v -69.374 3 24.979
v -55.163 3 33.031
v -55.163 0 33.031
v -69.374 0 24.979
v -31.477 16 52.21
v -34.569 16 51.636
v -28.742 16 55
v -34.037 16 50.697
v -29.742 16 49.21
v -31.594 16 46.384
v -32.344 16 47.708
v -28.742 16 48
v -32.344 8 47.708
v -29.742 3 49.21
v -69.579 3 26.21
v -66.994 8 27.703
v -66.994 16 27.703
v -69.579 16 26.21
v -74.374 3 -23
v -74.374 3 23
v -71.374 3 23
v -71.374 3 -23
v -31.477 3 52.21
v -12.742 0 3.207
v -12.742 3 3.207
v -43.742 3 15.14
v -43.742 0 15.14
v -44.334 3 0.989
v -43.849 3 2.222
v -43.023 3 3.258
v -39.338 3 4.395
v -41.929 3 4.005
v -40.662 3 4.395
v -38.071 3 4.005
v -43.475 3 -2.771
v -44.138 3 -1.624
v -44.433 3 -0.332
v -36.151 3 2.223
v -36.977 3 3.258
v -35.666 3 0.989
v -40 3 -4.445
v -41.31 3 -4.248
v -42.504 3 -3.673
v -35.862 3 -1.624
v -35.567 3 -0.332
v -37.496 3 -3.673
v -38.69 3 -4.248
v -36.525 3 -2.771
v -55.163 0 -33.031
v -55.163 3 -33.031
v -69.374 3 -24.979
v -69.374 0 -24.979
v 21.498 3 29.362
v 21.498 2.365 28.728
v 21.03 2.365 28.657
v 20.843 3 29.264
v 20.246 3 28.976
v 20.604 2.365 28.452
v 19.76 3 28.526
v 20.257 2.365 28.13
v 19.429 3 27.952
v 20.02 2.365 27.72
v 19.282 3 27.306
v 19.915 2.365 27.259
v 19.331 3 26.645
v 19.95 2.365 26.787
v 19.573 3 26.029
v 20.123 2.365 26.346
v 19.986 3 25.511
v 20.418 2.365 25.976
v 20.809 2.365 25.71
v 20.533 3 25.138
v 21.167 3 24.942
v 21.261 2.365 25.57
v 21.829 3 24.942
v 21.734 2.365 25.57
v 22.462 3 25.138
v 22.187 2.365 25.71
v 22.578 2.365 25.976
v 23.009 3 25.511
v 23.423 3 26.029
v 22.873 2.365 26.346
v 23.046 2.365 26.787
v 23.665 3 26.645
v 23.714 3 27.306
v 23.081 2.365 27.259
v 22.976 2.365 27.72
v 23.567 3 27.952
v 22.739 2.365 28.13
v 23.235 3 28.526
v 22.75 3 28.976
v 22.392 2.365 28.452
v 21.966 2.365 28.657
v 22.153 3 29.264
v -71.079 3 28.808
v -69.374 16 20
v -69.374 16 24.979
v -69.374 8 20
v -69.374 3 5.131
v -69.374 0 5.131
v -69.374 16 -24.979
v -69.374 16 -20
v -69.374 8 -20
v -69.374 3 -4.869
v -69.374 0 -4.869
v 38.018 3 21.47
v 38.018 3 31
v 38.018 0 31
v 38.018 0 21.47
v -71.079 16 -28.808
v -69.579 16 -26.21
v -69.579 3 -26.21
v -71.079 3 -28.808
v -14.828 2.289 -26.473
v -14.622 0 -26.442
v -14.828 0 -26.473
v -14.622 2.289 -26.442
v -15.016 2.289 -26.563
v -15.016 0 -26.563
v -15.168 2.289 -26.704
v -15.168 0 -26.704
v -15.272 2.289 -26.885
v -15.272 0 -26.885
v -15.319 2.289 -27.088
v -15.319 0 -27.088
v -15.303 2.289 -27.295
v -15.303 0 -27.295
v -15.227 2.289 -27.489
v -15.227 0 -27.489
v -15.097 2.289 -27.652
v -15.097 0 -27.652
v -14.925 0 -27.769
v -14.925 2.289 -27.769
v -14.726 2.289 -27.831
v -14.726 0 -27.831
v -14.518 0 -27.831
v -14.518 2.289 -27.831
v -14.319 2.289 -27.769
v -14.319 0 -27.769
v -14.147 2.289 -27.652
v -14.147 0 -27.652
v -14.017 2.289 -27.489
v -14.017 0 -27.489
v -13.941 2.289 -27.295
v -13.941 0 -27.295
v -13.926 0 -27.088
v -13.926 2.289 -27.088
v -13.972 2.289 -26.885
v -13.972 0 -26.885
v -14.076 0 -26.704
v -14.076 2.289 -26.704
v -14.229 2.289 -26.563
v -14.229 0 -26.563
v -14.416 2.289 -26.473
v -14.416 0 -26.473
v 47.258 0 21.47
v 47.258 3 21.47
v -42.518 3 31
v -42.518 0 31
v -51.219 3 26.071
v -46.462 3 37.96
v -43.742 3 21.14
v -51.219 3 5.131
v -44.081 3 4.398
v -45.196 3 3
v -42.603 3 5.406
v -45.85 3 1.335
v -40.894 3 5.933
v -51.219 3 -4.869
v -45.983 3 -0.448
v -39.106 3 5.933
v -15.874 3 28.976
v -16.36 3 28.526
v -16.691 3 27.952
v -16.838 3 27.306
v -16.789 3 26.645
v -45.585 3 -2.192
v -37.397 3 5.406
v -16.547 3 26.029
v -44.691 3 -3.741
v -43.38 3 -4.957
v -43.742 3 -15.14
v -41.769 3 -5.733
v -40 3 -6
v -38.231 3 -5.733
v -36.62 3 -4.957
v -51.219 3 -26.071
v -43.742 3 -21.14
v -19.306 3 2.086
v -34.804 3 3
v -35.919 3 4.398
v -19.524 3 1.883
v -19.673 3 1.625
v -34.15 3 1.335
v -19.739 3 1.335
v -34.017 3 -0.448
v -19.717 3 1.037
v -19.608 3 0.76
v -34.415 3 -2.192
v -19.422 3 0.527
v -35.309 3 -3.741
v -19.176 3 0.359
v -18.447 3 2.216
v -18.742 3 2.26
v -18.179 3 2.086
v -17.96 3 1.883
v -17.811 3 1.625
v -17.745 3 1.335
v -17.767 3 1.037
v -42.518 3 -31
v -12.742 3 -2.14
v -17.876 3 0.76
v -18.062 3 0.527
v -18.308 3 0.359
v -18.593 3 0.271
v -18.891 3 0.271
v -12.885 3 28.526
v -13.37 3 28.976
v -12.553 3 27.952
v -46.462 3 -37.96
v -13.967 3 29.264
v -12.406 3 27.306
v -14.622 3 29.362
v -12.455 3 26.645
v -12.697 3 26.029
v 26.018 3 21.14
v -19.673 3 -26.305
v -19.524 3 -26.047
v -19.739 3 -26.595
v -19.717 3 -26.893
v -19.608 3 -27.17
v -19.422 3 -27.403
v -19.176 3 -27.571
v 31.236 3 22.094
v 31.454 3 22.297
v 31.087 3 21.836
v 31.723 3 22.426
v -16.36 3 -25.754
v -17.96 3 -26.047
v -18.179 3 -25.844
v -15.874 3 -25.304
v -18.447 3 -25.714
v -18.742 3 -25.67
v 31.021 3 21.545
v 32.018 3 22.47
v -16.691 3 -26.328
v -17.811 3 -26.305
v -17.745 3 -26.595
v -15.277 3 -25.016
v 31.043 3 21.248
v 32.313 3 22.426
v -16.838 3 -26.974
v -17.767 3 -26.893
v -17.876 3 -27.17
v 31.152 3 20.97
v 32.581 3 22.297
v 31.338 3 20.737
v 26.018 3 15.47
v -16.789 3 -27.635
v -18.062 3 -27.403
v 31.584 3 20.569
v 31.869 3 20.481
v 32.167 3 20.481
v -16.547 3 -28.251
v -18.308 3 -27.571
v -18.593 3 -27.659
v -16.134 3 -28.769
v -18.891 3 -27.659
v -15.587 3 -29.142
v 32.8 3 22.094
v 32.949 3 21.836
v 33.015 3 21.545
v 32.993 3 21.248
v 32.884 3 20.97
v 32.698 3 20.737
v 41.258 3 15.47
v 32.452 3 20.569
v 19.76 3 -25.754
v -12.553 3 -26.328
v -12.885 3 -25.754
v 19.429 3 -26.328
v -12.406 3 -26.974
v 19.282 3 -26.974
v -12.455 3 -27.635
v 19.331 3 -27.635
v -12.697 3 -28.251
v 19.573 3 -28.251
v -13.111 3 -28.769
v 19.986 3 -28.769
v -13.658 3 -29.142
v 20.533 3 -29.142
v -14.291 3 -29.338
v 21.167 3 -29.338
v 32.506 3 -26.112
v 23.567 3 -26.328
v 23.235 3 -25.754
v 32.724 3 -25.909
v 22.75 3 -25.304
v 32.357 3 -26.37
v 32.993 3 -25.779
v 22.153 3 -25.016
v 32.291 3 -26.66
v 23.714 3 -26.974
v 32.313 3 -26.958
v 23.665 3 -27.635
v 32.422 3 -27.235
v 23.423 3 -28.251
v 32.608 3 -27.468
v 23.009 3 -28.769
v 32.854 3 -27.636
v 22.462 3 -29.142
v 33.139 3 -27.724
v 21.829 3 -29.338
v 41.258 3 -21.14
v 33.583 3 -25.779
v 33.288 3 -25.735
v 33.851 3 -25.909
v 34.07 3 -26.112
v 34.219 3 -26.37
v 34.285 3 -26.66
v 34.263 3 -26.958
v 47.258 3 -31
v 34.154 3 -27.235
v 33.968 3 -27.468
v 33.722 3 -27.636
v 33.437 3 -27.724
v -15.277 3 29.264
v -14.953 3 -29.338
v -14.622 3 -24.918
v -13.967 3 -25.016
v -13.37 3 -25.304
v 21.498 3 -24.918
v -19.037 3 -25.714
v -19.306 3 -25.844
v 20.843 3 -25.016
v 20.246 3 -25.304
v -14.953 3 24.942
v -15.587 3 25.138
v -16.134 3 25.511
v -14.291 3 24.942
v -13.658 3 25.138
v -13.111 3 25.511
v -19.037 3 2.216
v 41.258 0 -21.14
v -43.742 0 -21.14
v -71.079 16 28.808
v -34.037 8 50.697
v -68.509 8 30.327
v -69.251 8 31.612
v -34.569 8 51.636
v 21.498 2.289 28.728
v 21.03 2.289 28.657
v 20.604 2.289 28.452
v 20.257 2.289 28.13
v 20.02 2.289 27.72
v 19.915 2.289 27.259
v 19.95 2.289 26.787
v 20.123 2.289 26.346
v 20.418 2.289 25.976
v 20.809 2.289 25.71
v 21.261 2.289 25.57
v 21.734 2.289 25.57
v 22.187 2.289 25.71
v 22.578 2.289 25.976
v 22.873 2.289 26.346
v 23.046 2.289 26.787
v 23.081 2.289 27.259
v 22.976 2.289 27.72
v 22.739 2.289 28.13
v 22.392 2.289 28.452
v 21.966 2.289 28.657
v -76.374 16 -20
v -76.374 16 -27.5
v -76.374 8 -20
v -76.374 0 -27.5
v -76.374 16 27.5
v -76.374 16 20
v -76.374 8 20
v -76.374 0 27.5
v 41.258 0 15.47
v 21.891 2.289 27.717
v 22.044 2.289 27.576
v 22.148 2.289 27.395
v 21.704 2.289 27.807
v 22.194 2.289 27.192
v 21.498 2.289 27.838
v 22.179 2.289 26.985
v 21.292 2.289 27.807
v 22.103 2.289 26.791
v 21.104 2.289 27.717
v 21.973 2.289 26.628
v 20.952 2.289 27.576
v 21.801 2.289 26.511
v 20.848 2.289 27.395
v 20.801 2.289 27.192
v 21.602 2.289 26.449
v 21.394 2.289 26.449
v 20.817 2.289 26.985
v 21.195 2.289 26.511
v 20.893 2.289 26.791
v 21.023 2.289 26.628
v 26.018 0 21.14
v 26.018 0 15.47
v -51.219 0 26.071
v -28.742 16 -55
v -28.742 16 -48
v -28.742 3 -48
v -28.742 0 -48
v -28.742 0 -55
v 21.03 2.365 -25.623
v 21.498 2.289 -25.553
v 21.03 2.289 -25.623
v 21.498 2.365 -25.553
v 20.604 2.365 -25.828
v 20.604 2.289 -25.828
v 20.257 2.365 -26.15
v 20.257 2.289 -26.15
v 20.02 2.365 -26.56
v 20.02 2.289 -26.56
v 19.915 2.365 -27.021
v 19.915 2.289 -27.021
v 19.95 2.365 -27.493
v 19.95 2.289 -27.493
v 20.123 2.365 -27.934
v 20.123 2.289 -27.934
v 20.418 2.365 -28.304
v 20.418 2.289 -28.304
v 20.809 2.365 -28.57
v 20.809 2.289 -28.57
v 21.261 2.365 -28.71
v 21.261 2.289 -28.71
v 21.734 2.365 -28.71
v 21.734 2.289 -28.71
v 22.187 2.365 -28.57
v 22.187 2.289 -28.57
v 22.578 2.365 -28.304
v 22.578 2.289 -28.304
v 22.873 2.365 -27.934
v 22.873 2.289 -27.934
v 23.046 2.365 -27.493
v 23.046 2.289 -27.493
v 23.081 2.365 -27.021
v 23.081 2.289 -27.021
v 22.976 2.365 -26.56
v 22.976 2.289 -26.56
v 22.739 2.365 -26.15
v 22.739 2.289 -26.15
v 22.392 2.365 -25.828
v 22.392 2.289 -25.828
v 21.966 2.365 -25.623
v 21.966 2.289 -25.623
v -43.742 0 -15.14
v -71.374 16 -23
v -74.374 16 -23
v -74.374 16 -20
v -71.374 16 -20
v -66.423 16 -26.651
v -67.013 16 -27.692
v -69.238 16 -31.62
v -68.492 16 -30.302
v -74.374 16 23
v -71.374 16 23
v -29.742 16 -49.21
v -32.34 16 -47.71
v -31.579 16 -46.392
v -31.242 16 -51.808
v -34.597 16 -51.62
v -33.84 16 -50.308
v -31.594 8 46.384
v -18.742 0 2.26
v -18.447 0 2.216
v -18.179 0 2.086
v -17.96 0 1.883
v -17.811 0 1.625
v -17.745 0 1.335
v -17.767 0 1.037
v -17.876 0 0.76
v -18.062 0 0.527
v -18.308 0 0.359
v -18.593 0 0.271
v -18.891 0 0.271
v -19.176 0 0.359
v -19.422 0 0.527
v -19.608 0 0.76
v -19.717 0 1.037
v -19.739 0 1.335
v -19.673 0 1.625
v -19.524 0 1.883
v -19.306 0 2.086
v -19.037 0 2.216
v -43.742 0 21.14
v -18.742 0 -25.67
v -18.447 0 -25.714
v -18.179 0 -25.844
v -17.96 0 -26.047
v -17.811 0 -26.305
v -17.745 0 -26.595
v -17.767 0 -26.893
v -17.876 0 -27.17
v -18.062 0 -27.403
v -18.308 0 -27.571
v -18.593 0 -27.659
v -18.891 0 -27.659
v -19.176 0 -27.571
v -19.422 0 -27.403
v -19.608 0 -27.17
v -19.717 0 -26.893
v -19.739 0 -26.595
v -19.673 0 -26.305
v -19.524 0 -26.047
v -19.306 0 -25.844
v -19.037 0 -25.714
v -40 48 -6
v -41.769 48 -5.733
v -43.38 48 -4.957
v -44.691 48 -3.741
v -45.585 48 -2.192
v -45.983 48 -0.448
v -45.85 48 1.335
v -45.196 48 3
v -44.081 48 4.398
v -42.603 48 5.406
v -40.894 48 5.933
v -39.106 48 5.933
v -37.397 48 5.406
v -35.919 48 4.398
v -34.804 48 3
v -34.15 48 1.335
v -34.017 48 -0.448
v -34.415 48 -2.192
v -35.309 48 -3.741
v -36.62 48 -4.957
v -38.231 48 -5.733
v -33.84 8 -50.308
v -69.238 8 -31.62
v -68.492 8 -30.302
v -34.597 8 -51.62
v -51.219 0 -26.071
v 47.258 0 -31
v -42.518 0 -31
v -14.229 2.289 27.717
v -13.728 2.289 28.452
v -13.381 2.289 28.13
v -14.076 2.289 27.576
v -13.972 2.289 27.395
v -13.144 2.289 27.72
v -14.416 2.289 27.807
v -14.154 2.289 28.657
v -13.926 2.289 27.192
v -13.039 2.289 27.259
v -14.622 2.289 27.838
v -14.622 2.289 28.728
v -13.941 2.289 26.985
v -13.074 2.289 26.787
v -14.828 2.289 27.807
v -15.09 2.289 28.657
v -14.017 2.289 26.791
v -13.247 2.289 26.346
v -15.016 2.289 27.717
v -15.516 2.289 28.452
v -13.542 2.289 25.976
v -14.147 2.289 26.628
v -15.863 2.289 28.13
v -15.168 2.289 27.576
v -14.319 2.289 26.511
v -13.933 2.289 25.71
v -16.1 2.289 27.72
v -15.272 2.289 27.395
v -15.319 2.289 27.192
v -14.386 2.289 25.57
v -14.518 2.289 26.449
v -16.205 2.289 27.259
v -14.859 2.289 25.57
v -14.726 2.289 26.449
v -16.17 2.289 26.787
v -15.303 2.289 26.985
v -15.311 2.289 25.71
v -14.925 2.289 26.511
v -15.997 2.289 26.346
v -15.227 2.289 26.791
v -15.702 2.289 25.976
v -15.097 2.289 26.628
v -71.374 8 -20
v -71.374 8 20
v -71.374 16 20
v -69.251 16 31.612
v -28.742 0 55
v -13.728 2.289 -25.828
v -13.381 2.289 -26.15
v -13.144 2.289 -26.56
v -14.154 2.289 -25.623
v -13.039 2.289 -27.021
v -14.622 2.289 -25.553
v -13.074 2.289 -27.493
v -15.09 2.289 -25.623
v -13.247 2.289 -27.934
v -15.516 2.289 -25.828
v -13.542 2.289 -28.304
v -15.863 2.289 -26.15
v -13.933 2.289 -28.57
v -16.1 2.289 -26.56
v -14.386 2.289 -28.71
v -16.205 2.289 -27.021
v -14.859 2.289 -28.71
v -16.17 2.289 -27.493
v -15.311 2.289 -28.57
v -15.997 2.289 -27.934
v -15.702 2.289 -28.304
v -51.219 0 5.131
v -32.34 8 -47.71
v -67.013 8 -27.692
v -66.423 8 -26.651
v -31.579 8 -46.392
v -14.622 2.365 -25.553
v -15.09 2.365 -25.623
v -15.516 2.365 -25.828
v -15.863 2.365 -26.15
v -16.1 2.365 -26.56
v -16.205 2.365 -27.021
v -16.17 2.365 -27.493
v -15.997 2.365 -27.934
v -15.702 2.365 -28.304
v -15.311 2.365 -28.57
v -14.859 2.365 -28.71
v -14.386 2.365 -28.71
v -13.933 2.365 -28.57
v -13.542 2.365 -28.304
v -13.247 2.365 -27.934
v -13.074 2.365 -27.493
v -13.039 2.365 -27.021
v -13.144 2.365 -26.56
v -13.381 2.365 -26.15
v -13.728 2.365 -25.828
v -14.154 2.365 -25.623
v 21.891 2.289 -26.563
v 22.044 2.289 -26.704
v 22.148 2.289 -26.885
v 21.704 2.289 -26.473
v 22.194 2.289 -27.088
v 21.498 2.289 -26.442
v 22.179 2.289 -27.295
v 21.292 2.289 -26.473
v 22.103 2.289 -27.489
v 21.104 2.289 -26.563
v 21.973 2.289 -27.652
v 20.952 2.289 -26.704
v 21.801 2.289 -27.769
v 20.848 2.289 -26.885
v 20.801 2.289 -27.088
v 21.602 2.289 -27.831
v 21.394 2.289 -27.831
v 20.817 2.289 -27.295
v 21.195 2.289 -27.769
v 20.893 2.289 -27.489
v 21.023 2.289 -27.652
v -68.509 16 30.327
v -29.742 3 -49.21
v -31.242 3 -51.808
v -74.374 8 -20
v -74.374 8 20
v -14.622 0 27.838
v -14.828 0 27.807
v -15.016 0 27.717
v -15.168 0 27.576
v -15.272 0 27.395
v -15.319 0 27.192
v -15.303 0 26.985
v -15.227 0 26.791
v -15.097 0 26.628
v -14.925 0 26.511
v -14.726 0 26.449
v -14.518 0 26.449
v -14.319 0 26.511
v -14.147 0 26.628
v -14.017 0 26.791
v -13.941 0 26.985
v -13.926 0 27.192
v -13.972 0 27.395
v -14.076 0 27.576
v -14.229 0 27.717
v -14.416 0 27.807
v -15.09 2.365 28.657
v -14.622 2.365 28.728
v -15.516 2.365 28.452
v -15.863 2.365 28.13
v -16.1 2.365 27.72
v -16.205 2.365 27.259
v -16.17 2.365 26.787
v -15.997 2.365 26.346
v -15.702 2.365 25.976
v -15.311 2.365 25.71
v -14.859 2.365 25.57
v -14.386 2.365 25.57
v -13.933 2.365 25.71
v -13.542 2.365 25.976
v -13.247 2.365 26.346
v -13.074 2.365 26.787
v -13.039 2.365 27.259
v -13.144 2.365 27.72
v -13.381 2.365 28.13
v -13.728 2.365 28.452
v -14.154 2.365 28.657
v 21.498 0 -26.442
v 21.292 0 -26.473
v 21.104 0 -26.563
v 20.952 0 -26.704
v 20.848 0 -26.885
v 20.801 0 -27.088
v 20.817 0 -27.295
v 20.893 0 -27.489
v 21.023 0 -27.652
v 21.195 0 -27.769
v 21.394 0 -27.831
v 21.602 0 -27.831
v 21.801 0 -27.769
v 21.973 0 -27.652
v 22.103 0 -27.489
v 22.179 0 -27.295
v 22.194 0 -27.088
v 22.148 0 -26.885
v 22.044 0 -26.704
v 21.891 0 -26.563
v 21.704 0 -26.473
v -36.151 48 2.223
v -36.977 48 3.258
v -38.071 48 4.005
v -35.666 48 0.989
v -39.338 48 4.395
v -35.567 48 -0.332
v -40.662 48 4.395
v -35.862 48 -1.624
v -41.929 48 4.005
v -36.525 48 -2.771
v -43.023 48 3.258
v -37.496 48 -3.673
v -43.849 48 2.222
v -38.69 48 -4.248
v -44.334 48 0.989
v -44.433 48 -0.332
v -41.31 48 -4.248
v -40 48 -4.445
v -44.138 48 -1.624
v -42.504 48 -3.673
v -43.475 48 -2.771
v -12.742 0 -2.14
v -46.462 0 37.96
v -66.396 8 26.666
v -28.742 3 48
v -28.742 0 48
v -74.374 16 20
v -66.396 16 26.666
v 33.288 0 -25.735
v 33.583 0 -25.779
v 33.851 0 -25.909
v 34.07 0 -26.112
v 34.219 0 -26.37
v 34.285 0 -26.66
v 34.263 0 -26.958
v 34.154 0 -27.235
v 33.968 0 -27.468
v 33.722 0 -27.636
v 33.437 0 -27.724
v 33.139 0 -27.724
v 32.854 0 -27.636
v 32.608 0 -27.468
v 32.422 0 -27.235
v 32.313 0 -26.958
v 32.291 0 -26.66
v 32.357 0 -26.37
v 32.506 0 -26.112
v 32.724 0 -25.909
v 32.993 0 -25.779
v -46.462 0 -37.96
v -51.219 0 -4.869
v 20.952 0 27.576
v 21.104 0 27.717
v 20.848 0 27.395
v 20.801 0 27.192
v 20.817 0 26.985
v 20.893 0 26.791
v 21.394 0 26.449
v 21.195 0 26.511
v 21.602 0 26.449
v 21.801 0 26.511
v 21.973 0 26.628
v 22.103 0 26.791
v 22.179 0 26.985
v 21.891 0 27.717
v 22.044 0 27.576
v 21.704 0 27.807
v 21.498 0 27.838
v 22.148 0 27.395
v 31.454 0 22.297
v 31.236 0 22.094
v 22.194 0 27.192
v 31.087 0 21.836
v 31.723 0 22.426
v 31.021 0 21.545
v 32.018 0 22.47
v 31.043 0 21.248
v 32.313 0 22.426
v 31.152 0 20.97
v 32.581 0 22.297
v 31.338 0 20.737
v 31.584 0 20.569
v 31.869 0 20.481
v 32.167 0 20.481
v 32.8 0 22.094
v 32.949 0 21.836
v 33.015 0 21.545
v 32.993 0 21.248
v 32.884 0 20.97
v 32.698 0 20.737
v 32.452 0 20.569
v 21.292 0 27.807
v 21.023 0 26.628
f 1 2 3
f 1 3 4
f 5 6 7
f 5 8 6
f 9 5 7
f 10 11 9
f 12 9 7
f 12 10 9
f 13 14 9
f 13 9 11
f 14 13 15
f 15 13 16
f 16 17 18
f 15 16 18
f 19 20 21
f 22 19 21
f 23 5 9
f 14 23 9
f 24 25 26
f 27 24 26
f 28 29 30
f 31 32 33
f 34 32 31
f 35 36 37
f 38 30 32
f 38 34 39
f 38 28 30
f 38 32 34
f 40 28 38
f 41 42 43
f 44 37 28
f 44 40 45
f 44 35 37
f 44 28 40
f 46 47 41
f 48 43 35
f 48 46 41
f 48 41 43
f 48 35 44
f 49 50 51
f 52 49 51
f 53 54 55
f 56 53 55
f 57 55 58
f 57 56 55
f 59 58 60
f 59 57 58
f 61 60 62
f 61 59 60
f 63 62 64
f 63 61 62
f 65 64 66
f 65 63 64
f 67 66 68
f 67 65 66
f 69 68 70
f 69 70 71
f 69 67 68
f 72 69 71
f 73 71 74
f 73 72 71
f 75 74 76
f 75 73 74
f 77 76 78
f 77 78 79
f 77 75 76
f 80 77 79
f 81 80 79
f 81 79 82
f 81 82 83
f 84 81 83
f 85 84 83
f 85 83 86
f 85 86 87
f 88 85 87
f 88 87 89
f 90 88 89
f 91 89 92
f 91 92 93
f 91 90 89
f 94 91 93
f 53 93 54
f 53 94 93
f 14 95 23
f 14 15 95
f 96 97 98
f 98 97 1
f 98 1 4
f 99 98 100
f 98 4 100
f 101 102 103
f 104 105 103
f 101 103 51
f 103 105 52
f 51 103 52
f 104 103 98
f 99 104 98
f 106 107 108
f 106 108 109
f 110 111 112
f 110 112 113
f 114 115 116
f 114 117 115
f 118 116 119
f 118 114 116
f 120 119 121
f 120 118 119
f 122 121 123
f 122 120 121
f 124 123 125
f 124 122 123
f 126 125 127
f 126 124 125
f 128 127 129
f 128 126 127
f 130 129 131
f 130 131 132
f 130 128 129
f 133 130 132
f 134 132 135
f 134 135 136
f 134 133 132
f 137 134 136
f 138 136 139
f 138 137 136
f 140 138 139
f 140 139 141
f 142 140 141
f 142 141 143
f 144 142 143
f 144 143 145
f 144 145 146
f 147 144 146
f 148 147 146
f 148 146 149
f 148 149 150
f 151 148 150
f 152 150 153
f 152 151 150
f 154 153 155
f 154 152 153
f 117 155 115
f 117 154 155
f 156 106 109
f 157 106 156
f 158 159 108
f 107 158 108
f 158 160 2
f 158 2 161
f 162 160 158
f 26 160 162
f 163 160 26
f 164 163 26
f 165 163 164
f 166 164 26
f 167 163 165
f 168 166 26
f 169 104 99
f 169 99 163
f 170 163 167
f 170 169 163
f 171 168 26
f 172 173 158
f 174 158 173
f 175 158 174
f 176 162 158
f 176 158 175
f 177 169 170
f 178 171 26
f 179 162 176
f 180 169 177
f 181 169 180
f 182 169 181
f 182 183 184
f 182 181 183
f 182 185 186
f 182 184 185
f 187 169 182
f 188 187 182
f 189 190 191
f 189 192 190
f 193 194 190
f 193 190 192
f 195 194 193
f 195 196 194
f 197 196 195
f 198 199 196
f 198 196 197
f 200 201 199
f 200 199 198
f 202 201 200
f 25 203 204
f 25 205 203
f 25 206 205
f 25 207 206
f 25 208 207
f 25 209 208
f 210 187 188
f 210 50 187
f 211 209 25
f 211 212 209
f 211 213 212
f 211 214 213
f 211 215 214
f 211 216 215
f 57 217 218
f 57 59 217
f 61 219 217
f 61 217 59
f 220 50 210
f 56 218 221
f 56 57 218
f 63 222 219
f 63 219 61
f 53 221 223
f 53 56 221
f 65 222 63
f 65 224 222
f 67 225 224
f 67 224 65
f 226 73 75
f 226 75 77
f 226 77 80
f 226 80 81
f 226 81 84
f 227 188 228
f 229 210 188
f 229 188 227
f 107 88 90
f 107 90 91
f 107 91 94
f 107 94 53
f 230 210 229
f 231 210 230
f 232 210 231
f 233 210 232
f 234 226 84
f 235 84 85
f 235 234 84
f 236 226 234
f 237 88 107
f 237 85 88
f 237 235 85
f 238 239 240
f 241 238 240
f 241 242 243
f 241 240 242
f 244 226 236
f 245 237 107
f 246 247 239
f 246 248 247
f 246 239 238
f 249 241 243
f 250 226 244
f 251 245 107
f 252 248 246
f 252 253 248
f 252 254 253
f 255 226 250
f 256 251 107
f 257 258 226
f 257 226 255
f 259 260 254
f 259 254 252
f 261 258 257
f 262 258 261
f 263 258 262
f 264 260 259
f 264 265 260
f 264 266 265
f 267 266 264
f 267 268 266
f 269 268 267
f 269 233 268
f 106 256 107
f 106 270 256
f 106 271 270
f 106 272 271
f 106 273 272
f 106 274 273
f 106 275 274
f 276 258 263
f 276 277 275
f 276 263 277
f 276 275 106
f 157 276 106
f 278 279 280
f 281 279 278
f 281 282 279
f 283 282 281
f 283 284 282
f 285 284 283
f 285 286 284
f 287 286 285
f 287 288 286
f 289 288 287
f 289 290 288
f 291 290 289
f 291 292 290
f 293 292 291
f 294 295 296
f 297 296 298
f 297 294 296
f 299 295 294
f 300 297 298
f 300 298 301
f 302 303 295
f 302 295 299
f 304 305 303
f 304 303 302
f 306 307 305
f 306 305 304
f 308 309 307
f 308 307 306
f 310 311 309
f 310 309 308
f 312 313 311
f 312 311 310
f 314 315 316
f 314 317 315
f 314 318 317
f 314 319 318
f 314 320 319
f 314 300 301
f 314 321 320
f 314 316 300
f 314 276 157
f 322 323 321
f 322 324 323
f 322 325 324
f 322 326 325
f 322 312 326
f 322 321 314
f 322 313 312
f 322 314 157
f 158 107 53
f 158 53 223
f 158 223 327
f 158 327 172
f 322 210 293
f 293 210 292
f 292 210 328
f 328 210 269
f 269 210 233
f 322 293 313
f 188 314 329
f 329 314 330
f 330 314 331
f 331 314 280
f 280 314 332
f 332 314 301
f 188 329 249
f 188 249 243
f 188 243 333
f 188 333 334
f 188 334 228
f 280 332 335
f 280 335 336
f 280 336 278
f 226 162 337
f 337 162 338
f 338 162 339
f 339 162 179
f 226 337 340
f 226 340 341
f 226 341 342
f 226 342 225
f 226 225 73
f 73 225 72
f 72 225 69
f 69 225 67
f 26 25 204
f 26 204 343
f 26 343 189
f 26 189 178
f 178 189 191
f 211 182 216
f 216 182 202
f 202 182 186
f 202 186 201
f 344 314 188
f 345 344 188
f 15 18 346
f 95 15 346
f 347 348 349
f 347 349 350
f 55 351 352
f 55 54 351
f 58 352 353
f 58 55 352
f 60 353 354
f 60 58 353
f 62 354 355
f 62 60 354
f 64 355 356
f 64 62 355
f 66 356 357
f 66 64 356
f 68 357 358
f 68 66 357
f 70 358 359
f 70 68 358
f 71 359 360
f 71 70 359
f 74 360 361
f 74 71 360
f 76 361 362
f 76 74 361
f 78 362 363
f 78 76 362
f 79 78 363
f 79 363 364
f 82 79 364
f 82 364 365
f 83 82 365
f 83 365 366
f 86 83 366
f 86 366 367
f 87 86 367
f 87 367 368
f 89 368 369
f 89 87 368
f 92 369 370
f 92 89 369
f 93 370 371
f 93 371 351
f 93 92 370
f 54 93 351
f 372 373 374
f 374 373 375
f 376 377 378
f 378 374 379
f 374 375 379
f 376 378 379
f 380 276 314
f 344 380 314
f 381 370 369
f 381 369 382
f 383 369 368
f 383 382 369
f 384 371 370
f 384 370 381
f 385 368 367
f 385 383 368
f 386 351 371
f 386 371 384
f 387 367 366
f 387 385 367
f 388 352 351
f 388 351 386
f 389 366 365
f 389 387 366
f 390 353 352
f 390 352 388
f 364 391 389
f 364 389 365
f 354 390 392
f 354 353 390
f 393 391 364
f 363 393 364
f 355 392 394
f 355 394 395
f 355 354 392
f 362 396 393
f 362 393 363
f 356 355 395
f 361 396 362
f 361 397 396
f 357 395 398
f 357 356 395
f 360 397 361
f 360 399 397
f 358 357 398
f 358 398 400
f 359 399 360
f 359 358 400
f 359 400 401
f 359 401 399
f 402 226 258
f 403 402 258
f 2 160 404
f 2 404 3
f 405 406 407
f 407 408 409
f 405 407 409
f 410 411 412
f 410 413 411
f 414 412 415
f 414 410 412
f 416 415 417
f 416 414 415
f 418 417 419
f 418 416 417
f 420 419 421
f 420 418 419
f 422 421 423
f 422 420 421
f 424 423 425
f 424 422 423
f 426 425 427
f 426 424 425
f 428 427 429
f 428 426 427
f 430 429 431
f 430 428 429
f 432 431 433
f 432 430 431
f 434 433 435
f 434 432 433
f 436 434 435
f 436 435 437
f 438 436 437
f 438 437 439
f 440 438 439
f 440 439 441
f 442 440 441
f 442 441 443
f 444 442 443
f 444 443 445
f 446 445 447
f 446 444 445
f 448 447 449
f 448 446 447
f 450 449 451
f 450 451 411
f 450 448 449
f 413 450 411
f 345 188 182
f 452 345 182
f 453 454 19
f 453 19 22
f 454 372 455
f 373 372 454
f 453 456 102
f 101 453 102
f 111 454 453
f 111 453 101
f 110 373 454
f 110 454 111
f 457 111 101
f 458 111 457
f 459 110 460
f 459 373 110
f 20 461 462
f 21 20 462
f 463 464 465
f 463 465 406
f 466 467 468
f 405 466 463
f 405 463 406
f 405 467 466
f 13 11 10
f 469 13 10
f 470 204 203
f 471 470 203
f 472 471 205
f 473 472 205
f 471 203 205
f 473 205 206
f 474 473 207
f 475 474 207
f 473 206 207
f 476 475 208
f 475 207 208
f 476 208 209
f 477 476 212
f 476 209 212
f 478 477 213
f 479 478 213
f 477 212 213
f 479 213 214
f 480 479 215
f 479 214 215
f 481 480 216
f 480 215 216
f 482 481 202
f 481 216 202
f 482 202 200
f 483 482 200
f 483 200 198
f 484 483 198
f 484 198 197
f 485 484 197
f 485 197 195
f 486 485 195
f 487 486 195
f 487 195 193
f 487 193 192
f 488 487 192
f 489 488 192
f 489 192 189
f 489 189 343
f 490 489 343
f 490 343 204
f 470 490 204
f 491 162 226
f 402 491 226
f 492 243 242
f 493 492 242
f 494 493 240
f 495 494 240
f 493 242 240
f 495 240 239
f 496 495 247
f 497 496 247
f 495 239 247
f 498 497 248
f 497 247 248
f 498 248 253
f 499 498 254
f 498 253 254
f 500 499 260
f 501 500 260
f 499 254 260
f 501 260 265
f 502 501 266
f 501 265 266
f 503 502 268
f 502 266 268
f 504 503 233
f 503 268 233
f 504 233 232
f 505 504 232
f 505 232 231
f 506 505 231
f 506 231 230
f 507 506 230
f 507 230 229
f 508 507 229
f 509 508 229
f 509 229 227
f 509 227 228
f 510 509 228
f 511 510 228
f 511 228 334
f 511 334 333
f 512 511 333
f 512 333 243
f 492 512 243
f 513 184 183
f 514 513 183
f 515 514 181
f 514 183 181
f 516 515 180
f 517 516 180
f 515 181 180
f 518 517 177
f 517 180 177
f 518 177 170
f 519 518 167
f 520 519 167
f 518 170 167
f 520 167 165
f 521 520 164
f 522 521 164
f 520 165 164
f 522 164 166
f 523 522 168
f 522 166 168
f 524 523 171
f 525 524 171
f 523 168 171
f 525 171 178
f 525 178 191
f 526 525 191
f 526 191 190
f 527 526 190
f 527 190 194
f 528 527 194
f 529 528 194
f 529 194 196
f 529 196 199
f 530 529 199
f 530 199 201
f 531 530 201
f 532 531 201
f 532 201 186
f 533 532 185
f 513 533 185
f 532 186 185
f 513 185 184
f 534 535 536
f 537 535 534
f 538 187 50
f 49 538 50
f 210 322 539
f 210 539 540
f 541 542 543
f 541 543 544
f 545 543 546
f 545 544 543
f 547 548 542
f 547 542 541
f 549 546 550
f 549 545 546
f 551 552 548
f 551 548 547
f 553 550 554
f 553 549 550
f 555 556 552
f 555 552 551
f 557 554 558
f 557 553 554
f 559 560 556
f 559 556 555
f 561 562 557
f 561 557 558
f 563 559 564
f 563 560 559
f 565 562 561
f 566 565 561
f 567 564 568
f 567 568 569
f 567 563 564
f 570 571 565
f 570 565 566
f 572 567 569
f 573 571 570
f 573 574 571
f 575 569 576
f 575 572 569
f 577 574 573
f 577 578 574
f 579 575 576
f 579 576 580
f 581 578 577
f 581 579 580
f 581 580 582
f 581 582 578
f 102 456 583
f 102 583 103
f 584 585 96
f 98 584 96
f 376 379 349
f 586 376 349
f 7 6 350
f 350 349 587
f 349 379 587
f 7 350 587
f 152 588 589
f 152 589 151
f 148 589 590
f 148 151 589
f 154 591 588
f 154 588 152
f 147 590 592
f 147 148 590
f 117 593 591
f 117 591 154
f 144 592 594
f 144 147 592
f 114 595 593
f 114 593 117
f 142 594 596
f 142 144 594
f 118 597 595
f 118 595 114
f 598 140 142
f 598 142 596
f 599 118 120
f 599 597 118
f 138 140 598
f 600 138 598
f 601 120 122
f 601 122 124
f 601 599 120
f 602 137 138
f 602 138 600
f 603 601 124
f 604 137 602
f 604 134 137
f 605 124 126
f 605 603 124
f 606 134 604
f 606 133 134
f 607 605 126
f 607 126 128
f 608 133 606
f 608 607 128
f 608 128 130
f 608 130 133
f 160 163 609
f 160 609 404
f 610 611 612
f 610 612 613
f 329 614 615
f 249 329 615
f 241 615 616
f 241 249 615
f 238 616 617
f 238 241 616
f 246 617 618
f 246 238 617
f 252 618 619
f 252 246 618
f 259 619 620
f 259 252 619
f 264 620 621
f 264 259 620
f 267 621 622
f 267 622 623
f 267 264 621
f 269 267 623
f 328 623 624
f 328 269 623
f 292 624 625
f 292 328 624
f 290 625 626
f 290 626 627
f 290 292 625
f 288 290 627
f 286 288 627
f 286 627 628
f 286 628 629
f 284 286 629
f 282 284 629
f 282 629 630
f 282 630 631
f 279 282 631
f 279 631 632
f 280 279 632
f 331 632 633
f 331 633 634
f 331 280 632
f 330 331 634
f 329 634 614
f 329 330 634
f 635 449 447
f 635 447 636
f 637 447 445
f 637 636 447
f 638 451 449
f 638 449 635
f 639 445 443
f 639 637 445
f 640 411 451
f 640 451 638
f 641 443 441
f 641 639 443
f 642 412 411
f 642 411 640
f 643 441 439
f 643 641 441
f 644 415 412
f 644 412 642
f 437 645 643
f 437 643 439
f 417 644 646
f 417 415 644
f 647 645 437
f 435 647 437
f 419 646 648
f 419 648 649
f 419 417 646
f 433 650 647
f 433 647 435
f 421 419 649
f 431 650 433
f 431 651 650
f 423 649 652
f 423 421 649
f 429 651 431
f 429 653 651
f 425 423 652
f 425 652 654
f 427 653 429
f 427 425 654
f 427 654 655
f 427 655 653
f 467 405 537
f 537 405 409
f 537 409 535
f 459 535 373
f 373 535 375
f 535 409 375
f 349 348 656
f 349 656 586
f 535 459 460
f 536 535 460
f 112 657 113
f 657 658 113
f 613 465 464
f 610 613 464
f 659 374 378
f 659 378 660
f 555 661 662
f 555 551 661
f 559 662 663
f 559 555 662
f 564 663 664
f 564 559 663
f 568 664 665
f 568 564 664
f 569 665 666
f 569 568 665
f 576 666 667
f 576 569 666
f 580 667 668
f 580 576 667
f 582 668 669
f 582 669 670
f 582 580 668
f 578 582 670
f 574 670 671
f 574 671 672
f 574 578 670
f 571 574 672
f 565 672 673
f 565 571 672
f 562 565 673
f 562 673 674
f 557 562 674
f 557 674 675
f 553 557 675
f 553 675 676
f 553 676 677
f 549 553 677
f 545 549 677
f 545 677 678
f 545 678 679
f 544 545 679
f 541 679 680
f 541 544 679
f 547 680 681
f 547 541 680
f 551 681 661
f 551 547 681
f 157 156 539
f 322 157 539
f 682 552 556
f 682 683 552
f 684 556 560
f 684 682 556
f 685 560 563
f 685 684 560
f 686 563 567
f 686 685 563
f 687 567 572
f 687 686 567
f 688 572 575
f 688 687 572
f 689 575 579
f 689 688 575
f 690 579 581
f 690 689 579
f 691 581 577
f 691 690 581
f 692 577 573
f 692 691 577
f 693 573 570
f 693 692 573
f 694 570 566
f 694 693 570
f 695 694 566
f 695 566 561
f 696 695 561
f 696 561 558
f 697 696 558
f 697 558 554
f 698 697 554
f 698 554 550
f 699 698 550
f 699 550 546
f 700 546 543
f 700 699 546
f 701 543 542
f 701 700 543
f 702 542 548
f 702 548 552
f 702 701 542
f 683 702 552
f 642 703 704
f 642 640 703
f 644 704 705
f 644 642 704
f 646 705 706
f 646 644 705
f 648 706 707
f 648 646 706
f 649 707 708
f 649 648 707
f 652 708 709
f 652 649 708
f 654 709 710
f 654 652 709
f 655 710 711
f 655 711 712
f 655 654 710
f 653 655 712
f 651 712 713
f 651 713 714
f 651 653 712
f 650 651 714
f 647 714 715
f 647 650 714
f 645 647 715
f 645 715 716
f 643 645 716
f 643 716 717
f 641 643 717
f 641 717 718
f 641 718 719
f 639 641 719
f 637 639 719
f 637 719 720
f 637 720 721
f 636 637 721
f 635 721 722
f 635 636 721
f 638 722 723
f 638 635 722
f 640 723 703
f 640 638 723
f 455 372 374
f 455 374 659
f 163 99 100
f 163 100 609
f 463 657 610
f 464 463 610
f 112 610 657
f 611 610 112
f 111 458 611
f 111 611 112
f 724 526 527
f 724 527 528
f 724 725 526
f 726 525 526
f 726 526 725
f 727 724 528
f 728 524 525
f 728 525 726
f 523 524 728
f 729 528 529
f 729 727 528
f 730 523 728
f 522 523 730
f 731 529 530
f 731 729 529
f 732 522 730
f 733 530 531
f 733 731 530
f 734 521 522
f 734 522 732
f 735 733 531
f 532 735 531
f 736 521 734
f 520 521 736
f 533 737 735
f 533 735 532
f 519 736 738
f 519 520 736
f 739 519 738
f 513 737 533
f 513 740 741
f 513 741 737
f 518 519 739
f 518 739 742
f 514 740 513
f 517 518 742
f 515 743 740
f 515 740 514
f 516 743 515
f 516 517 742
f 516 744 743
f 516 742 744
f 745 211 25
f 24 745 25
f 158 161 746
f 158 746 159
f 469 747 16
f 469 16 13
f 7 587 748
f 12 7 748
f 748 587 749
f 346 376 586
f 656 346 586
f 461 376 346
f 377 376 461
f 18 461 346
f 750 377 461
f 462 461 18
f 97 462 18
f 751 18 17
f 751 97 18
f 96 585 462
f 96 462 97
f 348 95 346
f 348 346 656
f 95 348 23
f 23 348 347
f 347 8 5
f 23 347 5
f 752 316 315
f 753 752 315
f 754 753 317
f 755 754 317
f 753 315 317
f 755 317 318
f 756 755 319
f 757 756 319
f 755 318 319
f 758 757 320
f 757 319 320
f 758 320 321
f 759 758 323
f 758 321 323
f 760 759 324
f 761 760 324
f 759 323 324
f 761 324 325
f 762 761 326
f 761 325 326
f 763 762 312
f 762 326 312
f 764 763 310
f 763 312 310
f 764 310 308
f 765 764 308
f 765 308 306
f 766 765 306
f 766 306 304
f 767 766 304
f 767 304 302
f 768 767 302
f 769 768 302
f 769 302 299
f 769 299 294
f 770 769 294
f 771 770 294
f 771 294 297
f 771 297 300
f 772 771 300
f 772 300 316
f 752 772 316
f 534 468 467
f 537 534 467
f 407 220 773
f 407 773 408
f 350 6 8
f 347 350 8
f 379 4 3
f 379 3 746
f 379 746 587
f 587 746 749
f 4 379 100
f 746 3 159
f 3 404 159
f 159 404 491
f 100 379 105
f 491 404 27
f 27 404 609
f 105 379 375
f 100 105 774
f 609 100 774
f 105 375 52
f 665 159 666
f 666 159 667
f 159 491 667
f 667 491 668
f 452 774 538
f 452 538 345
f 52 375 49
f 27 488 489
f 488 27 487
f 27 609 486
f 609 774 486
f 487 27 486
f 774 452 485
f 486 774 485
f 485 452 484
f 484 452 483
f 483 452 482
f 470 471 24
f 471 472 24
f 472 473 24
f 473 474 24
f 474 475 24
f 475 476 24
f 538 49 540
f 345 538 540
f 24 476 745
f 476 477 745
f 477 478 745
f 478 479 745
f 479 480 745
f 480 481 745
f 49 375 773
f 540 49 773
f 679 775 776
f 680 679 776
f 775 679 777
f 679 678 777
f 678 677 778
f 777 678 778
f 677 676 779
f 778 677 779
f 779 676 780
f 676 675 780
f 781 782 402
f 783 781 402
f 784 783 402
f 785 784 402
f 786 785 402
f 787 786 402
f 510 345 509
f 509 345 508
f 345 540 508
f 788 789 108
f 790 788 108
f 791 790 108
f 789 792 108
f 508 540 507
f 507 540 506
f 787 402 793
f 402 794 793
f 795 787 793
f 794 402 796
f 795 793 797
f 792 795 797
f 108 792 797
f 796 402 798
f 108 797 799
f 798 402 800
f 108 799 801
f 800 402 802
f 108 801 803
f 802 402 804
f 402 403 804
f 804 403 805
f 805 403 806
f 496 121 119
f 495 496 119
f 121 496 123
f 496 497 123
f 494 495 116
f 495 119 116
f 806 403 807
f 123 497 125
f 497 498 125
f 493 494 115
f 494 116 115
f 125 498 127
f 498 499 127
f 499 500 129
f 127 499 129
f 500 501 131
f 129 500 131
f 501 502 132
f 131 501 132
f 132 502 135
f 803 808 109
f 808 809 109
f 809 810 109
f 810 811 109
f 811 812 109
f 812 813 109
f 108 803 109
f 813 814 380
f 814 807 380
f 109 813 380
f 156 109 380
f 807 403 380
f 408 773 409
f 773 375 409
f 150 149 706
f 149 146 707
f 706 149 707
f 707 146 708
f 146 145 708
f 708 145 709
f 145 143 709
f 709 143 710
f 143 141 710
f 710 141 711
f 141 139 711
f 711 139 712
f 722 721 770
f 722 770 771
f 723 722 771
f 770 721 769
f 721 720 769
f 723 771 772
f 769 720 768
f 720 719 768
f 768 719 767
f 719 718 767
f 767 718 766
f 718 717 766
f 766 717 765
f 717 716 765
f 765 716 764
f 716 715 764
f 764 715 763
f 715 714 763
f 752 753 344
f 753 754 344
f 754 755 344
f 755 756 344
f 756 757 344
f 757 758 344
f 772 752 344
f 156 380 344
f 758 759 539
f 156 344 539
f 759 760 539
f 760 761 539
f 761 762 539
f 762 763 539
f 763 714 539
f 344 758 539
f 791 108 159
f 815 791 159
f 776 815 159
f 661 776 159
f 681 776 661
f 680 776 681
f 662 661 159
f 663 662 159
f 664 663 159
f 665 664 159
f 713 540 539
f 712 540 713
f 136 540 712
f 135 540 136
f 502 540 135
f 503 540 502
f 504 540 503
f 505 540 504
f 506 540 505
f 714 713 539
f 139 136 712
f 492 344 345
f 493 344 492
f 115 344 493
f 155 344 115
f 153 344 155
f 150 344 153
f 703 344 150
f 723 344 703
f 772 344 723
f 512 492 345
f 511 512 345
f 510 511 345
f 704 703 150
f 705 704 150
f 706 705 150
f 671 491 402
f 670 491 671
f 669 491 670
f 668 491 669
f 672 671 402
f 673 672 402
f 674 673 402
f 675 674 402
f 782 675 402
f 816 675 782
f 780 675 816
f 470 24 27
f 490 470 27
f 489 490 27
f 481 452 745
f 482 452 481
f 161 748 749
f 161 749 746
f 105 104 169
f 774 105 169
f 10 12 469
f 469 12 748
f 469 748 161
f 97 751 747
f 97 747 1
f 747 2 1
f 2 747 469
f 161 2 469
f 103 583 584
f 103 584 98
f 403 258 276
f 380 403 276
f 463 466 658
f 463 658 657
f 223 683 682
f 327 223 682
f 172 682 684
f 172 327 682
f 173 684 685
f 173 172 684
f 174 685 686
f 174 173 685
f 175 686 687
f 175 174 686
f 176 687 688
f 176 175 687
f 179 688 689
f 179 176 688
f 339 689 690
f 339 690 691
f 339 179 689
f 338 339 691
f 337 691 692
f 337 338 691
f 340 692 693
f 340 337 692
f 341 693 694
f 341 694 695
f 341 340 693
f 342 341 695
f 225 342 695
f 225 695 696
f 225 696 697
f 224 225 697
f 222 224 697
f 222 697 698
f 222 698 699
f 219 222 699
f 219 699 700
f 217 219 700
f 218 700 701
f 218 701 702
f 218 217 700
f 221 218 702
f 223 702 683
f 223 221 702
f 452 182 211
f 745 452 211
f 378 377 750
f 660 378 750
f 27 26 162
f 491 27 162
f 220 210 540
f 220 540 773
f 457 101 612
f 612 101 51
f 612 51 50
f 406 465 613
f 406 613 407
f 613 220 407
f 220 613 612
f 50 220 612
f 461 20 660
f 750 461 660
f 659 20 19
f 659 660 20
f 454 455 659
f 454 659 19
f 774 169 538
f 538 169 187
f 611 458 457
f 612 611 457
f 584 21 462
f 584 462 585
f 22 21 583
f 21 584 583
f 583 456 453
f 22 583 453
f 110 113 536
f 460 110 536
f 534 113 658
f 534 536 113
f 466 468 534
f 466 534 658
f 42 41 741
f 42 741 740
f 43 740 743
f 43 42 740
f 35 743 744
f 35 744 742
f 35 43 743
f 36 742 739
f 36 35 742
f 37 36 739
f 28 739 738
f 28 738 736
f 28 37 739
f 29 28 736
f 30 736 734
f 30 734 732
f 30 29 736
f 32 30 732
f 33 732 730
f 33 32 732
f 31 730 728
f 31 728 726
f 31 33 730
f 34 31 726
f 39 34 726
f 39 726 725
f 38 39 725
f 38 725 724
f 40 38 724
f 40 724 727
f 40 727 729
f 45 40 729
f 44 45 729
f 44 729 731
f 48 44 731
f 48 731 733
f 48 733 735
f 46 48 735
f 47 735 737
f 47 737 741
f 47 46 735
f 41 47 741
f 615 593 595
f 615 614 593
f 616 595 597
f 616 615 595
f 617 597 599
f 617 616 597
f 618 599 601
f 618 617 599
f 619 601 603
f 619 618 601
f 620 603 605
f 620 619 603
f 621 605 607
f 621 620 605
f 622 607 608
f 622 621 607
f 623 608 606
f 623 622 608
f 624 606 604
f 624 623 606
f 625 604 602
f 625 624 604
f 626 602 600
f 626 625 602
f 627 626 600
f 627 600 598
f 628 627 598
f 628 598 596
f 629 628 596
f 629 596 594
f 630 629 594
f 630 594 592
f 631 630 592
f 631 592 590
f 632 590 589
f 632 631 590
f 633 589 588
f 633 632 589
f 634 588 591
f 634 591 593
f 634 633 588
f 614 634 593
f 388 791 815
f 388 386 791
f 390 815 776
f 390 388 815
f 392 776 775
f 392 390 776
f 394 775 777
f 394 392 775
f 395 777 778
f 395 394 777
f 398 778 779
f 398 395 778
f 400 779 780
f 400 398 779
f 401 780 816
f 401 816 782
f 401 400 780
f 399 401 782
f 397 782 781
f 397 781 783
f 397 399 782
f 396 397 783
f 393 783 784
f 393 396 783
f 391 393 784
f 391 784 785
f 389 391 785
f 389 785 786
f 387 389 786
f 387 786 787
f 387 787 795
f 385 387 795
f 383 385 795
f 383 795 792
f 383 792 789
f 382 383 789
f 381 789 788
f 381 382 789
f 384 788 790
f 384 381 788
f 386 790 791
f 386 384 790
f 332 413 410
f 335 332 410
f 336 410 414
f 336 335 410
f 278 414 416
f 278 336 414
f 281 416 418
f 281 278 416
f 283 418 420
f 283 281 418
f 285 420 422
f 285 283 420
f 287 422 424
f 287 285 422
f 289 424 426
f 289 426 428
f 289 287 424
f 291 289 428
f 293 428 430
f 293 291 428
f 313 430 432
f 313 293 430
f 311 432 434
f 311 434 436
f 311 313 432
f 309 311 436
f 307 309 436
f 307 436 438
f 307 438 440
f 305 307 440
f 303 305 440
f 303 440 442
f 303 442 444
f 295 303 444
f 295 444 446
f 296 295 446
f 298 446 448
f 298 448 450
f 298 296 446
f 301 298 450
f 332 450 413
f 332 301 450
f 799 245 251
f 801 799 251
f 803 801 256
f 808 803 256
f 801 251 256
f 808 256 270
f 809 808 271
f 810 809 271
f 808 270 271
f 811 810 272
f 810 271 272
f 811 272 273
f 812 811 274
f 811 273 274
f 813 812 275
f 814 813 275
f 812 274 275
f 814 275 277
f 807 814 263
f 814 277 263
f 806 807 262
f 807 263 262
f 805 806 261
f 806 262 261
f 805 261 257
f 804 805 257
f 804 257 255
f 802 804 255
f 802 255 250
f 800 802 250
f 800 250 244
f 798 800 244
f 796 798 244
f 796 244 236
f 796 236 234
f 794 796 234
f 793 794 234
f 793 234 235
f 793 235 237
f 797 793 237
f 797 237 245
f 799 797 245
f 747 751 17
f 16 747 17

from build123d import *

# Parameters (mm, degrees)
BOSS_EXTRUDE1_DEPTH                         = 3
BOSS_EXTRUDE7_DEPTH                         = 13
SKETCH14_W                                  = 3
SKETCH14_H                                  = 46
CUT_EXTRUDE1_DEPTH                          = 13
SKETCH15_W                                  = 7
SKETCH15_H                                  = 40
CUT_EXTRUDE3_DEPTH                          = 8
CUT_EXTRUDE5_REACH                          = 97.01
SKETCH18_R                                  = 6
SKETCH18_R_2                                = 4.445
BOSS_EXTRUDE8_DEPTH                         = 45
CBORE_FOR_00_BINDING_HEAD_MACHINE_S_2_COUNT = 2
CBORE_FOR_00_BINDING_HEAD_MACHINE_S_2_PITCH = 54.28
CBORE_FOR_00_BINDING_HEAD_MACHINE_S_3_COUNT = 2
CBORE_FOR_00_BINDING_HEAD_MACHINE_S_3_PITCH = 65.199484661
CBORE_FOR_00_BINDING_HEAD_MACHINE_S_4_COUNT = 2
CBORE_FOR_00_BINDING_HEAD_MACHINE_S_4_PITCH = 36.12
SKETCH22_R                                  = 1
CUT_EXTRUDE6_DEPTH                          = 105.321261807
CUT_EXTRUDE8_DEPTH                          = 105.321261807
SKETCH24_W                                  = 9.24
SKETCH24_H                                  = 9.529738598
CUT_EXTRUDE9_DEPTH                          = 105.321261807


with BuildPart() as part:
    # Sketch1 → Boss-Extrude1 (new body)
    with BuildSketch(Plane(origin=(0, 0, 0), x_dir=(1, 0, 0), z_dir=(0, 1, 0))):
        Polygon((-76.37359272, 27.5), (-76.37359272, -27.5), (-28.742195512, -55), (-28.742195512, -31), (47.257804488, -31), (47.257804488, 31), (-28.742195512, 31), (-28.742195512, 55), align=None)
    extrude(amount=BOSS_EXTRUDE1_DEPTH)

    # Sketch11 → Boss-Extrude7 (add)
    with BuildSketch(Plane(origin=(0, 3, 0), x_dir=(1, 0, 0), z_dir=(0, 1, 0))):
        Polygon((-28.742195512, -55), (-28.742195512, -48), (-69.37359272, -24.979495292), (-69.37359272, 24.979495292), (-28.742195512, 48), (-28.742195512, 55), (-76.37359272, 27.5), (-76.37359272, -27.5), align=None)
    extrude(amount=BOSS_EXTRUDE7_DEPTH)

    # Sketch14 → Cut-Extrude1 (cut)
    with BuildSketch(Plane(origin=(0, 16, 0), x_dir=(1, 0, 0), z_dir=(0, 1, 0))):
        Polygon((-29.742195512, 49.210281508), (-69.579364086, 26.210281508), (-71.079364086, 28.80835772), (-31.242195512, 51.80835772), align=None)
        with Locations((-72.87359272, 0)):
            Rectangle(SKETCH14_W, SKETCH14_H)
        Polygon((-71.079364086, -28.80835772), (-31.476965636, -52.210281508), (-29.742195512, -49.210281508), (-69.579364086, -26.210281508), align=None)
    extrude(amount=-CUT_EXTRUDE1_DEPTH, mode=Mode.SUBTRACT)

    # Sketch15 → Cut-Extrude3 (cut)
    with BuildSketch(Plane(origin=(0, 16, 0), x_dir=(1, 0, 0), z_dir=(0, 1, 0))):
        with Locations((-72.87359272, 0)):
            Rectangle(SKETCH15_W, SKETCH15_H)
        Polygon((-69.238309522, 31.619557675), (-66.423300051, 26.651040721), (-31.579449527, 46.392498809), (-34.59729337, 51.619557675), align=None)
        Polygon((-66.396023158, -26.666494973), (-69.251333812, -31.612038098), (-34.568999008, -51.635893433), (-31.593683239, -46.384434424), align=None)
    extrude(amount=-CUT_EXTRUDE3_DEPTH, mode=Mode.SUBTRACT)

    # Sketch17 → Cut-Extrude5 (cut, up to next)
    with BuildSketch(Plane(origin=(0, 3, 0), x_dir=(1, 0, 0), z_dir=(0, 1, 0)), mode=Mode.PRIVATE) as cut_extrude5_sk1:
        Polygon((-69.37359272, -24.979495292), (-69.37359272, -5.130907192), (-51.219056623, -5.130907192), (-51.219056623, -26.070515137), (-55.162644513, -33.030983121), align=None)
    cut_extrude5_tool1 = extrude(cut_extrude5_sk1.sketch, amount=-CUT_EXTRUDE5_REACH, mode=Mode.PRIVATE) & part.part
    # Sketch17 → Cut-Extrude5 (cut, up to next)
    with BuildSketch(Plane(origin=(0, 3, 0), x_dir=(1, 0, 0), z_dir=(0, 1, 0)), mode=Mode.PRIVATE) as cut_extrude5_sk2:
        Polygon((-69.37359272, 24.979495292), (-69.37359272, 4.869092808), (-51.219056623, 4.869092808), (-51.219056623, 26.070515137), (-55.162644513, 33.030983121), align=None)
    cut_extrude5_tool2 = extrude(cut_extrude5_sk2.sketch, amount=-CUT_EXTRUDE5_REACH, mode=Mode.PRIVATE) & part.part
    # Sketch17 → Cut-Extrude5 (cut, up to next)
    with BuildSketch(Plane(origin=(0, 3, 0), x_dir=(1, 0, 0), z_dir=(0, 1, 0)), mode=Mode.PRIVATE) as cut_extrude5_sk3:
        Polygon((-28.742195512, -48), (-46.462059534, -37.960467984), (-42.518471644, -31), (-28.742195512, -31), align=None)
    cut_extrude5_tool3 = extrude(cut_extrude5_sk3.sketch, amount=-CUT_EXTRUDE5_REACH, mode=Mode.PRIVATE) & part.part
    # Sketch17 → Cut-Extrude5 (cut, up to next)
    with BuildSketch(Plane(origin=(0, 3, 0), x_dir=(1, 0, 0), z_dir=(0, 1, 0)), mode=Mode.PRIVATE) as cut_extrude5_sk4:
        Polygon((-28.742195512, 31), (-42.518471644, 31), (-46.462059534, 37.960467984), (-28.742195512, 48), align=None)
    cut_extrude5_tool4 = extrude(cut_extrude5_sk4.sketch, amount=-CUT_EXTRUDE5_REACH, mode=Mode.PRIVATE) & part.part
    add(cut_extrude5_tool1.solids().sort_by_distance((-59.97086, 3, 17.234777))[0], mode=Mode.SUBTRACT)
    add(cut_extrude5_tool2.solids().sort_by_distance((-59.974373, 3, -17.10271))[0], mode=Mode.SUBTRACT)
    add(cut_extrude5_tool3.solids().sort_by_distance((-35.757612, 3, 37.618563))[0], mode=Mode.SUBTRACT)
    add(cut_extrude5_tool4.solids().sort_by_distance((-35.757612, 3, -37.618563))[0], mode=Mode.SUBTRACT)

    # Sketch18 → Boss-Extrude8 (add)
    with BuildSketch(Plane(origin=(0, 3, 0), x_dir=(1, 0, 0), z_dir=(0, 1, 0))):
        with Locations(Location((-40, 0, 0), (0, 0, 90))):
            Circle(SKETCH18_R)
        with Locations(Location((-40, 0, 0), (0, 0, 90))):
            Circle(SKETCH18_R_2, mode=Mode.SUBTRACT)
    extrude(amount=BOSS_EXTRUDE8_DEPTH)

    # Sketch21 → CBORE for #00 Binding Head Machine Screw1 (revolve, cut)
    with BuildSketch(Plane(origin=(-14.622195512, 3, 27.14), x_dir=(0, 0, 1), z_dir=(1, 0, 0))):
        Polygon((0, 0), (0, 3), (0.6985, 3), (0.6985, 0.7112), (1.5875, 0.7112), (1.5875, 0.635), (2.2225, 0), align=None)
    cbore_for_00_binding_head_machine_screw = revolve(axis=Axis((-14.622195512, 9.35, 27.14), (0, -1, 0)), mode=Mode.SUBTRACT)

    # CBORE for _00 Binding Head Machine S 2: CBORE for #00 Binding Head Machine Screw1 ×2
    with Locations(*[(0, 0, -i * CBORE_FOR_00_BINDING_HEAD_MACHINE_S_2_PITCH) for i in range(1, CBORE_FOR_00_BINDING_HEAD_MACHINE_S_2_COUNT)]):
        add(cbore_for_00_binding_head_machine_screw, mode=Mode.SUBTRACT)

    # CBORE for _00 Binding Head Machine S 3: CBORE for #00 Binding Head Machine Screw1 ×2
    with Locations(*[Vector(0.5539921088035915, 0, -0.832521917659439) * (i * CBORE_FOR_00_BINDING_HEAD_MACHINE_S_3_PITCH) for i in range(1, CBORE_FOR_00_BINDING_HEAD_MACHINE_S_3_COUNT)]):
        add(cbore_for_00_binding_head_machine_screw, mode=Mode.SUBTRACT)

    # CBORE for _00 Binding Head Machine S 4: CBORE for #00 Binding Head Machine Screw1 ×2
    with Locations(*[(i * CBORE_FOR_00_BINDING_HEAD_MACHINE_S_4_PITCH, 0, 0) for i in range(1, CBORE_FOR_00_BINDING_HEAD_MACHINE_S_4_COUNT)]):
        add(cbore_for_00_binding_head_machine_screw, mode=Mode.SUBTRACT)

    # Sketch22 → Cut-Extrude6 (cut, through all)
    with BuildSketch(Plane(origin=(0, 3, 0), x_dir=(1, 0, 0), z_dir=(0, 1, 0))):
        with Locations(Location((33.287804488, 26.734999831, 0), (0, 0, 270))):
            Circle(SKETCH22_R)
        with Locations(Location((32.017804488, -21.470261402, 0), (0, 0, 270))):
            Circle(SKETCH22_R)
        with Locations(Location((-18.742195512, 26.67, 0), (0, 0, 270))):
            Circle(SKETCH22_R)
        with Locations(Location((-18.742195512, -1.26, 0), (0, 0, 270))):
            Circle(SKETCH22_R)
    extrude(amount=-CUT_EXTRUDE6_DEPTH, mode=Mode.SUBTRACT)

    # Sketch23 → Cut-Extrude8 (cut, through all)
    with BuildSketch(Plane(origin=(0, 3, 0), x_dir=(1, 0, 0), z_dir=(0, 1, 0))):
        Polygon((-43.742195512, 21.14), (-43.742195512, 15.14), (-12.742195512, 2.140015237), (-12.742195512, -3.206984729), (-43.742195512, -15.14), (-43.742195512, -21.14), (26.017804488, -21.14), (26.017804488, -15.470261402), (41.257804488, -15.470261402), (41.257804488, 21.14), align=None)
    extrude(amount=-CUT_EXTRUDE8_DEPTH, mode=Mode.SUBTRACT)

    # Sketch24 → Cut-Extrude9 (cut, through all)
    with BuildSketch(Plane(origin=(0, 3, 0), x_dir=(1, 0, 0), z_dir=(0, 1, 0))):
        with Locations((42.637804488, -26.235130701)):
            Rectangle(SKETCH24_W, SKETCH24_H)
    extrude(amount=-CUT_EXTRUDE9_DEPTH, mode=Mode.SUBTRACT)


solid = part.part
